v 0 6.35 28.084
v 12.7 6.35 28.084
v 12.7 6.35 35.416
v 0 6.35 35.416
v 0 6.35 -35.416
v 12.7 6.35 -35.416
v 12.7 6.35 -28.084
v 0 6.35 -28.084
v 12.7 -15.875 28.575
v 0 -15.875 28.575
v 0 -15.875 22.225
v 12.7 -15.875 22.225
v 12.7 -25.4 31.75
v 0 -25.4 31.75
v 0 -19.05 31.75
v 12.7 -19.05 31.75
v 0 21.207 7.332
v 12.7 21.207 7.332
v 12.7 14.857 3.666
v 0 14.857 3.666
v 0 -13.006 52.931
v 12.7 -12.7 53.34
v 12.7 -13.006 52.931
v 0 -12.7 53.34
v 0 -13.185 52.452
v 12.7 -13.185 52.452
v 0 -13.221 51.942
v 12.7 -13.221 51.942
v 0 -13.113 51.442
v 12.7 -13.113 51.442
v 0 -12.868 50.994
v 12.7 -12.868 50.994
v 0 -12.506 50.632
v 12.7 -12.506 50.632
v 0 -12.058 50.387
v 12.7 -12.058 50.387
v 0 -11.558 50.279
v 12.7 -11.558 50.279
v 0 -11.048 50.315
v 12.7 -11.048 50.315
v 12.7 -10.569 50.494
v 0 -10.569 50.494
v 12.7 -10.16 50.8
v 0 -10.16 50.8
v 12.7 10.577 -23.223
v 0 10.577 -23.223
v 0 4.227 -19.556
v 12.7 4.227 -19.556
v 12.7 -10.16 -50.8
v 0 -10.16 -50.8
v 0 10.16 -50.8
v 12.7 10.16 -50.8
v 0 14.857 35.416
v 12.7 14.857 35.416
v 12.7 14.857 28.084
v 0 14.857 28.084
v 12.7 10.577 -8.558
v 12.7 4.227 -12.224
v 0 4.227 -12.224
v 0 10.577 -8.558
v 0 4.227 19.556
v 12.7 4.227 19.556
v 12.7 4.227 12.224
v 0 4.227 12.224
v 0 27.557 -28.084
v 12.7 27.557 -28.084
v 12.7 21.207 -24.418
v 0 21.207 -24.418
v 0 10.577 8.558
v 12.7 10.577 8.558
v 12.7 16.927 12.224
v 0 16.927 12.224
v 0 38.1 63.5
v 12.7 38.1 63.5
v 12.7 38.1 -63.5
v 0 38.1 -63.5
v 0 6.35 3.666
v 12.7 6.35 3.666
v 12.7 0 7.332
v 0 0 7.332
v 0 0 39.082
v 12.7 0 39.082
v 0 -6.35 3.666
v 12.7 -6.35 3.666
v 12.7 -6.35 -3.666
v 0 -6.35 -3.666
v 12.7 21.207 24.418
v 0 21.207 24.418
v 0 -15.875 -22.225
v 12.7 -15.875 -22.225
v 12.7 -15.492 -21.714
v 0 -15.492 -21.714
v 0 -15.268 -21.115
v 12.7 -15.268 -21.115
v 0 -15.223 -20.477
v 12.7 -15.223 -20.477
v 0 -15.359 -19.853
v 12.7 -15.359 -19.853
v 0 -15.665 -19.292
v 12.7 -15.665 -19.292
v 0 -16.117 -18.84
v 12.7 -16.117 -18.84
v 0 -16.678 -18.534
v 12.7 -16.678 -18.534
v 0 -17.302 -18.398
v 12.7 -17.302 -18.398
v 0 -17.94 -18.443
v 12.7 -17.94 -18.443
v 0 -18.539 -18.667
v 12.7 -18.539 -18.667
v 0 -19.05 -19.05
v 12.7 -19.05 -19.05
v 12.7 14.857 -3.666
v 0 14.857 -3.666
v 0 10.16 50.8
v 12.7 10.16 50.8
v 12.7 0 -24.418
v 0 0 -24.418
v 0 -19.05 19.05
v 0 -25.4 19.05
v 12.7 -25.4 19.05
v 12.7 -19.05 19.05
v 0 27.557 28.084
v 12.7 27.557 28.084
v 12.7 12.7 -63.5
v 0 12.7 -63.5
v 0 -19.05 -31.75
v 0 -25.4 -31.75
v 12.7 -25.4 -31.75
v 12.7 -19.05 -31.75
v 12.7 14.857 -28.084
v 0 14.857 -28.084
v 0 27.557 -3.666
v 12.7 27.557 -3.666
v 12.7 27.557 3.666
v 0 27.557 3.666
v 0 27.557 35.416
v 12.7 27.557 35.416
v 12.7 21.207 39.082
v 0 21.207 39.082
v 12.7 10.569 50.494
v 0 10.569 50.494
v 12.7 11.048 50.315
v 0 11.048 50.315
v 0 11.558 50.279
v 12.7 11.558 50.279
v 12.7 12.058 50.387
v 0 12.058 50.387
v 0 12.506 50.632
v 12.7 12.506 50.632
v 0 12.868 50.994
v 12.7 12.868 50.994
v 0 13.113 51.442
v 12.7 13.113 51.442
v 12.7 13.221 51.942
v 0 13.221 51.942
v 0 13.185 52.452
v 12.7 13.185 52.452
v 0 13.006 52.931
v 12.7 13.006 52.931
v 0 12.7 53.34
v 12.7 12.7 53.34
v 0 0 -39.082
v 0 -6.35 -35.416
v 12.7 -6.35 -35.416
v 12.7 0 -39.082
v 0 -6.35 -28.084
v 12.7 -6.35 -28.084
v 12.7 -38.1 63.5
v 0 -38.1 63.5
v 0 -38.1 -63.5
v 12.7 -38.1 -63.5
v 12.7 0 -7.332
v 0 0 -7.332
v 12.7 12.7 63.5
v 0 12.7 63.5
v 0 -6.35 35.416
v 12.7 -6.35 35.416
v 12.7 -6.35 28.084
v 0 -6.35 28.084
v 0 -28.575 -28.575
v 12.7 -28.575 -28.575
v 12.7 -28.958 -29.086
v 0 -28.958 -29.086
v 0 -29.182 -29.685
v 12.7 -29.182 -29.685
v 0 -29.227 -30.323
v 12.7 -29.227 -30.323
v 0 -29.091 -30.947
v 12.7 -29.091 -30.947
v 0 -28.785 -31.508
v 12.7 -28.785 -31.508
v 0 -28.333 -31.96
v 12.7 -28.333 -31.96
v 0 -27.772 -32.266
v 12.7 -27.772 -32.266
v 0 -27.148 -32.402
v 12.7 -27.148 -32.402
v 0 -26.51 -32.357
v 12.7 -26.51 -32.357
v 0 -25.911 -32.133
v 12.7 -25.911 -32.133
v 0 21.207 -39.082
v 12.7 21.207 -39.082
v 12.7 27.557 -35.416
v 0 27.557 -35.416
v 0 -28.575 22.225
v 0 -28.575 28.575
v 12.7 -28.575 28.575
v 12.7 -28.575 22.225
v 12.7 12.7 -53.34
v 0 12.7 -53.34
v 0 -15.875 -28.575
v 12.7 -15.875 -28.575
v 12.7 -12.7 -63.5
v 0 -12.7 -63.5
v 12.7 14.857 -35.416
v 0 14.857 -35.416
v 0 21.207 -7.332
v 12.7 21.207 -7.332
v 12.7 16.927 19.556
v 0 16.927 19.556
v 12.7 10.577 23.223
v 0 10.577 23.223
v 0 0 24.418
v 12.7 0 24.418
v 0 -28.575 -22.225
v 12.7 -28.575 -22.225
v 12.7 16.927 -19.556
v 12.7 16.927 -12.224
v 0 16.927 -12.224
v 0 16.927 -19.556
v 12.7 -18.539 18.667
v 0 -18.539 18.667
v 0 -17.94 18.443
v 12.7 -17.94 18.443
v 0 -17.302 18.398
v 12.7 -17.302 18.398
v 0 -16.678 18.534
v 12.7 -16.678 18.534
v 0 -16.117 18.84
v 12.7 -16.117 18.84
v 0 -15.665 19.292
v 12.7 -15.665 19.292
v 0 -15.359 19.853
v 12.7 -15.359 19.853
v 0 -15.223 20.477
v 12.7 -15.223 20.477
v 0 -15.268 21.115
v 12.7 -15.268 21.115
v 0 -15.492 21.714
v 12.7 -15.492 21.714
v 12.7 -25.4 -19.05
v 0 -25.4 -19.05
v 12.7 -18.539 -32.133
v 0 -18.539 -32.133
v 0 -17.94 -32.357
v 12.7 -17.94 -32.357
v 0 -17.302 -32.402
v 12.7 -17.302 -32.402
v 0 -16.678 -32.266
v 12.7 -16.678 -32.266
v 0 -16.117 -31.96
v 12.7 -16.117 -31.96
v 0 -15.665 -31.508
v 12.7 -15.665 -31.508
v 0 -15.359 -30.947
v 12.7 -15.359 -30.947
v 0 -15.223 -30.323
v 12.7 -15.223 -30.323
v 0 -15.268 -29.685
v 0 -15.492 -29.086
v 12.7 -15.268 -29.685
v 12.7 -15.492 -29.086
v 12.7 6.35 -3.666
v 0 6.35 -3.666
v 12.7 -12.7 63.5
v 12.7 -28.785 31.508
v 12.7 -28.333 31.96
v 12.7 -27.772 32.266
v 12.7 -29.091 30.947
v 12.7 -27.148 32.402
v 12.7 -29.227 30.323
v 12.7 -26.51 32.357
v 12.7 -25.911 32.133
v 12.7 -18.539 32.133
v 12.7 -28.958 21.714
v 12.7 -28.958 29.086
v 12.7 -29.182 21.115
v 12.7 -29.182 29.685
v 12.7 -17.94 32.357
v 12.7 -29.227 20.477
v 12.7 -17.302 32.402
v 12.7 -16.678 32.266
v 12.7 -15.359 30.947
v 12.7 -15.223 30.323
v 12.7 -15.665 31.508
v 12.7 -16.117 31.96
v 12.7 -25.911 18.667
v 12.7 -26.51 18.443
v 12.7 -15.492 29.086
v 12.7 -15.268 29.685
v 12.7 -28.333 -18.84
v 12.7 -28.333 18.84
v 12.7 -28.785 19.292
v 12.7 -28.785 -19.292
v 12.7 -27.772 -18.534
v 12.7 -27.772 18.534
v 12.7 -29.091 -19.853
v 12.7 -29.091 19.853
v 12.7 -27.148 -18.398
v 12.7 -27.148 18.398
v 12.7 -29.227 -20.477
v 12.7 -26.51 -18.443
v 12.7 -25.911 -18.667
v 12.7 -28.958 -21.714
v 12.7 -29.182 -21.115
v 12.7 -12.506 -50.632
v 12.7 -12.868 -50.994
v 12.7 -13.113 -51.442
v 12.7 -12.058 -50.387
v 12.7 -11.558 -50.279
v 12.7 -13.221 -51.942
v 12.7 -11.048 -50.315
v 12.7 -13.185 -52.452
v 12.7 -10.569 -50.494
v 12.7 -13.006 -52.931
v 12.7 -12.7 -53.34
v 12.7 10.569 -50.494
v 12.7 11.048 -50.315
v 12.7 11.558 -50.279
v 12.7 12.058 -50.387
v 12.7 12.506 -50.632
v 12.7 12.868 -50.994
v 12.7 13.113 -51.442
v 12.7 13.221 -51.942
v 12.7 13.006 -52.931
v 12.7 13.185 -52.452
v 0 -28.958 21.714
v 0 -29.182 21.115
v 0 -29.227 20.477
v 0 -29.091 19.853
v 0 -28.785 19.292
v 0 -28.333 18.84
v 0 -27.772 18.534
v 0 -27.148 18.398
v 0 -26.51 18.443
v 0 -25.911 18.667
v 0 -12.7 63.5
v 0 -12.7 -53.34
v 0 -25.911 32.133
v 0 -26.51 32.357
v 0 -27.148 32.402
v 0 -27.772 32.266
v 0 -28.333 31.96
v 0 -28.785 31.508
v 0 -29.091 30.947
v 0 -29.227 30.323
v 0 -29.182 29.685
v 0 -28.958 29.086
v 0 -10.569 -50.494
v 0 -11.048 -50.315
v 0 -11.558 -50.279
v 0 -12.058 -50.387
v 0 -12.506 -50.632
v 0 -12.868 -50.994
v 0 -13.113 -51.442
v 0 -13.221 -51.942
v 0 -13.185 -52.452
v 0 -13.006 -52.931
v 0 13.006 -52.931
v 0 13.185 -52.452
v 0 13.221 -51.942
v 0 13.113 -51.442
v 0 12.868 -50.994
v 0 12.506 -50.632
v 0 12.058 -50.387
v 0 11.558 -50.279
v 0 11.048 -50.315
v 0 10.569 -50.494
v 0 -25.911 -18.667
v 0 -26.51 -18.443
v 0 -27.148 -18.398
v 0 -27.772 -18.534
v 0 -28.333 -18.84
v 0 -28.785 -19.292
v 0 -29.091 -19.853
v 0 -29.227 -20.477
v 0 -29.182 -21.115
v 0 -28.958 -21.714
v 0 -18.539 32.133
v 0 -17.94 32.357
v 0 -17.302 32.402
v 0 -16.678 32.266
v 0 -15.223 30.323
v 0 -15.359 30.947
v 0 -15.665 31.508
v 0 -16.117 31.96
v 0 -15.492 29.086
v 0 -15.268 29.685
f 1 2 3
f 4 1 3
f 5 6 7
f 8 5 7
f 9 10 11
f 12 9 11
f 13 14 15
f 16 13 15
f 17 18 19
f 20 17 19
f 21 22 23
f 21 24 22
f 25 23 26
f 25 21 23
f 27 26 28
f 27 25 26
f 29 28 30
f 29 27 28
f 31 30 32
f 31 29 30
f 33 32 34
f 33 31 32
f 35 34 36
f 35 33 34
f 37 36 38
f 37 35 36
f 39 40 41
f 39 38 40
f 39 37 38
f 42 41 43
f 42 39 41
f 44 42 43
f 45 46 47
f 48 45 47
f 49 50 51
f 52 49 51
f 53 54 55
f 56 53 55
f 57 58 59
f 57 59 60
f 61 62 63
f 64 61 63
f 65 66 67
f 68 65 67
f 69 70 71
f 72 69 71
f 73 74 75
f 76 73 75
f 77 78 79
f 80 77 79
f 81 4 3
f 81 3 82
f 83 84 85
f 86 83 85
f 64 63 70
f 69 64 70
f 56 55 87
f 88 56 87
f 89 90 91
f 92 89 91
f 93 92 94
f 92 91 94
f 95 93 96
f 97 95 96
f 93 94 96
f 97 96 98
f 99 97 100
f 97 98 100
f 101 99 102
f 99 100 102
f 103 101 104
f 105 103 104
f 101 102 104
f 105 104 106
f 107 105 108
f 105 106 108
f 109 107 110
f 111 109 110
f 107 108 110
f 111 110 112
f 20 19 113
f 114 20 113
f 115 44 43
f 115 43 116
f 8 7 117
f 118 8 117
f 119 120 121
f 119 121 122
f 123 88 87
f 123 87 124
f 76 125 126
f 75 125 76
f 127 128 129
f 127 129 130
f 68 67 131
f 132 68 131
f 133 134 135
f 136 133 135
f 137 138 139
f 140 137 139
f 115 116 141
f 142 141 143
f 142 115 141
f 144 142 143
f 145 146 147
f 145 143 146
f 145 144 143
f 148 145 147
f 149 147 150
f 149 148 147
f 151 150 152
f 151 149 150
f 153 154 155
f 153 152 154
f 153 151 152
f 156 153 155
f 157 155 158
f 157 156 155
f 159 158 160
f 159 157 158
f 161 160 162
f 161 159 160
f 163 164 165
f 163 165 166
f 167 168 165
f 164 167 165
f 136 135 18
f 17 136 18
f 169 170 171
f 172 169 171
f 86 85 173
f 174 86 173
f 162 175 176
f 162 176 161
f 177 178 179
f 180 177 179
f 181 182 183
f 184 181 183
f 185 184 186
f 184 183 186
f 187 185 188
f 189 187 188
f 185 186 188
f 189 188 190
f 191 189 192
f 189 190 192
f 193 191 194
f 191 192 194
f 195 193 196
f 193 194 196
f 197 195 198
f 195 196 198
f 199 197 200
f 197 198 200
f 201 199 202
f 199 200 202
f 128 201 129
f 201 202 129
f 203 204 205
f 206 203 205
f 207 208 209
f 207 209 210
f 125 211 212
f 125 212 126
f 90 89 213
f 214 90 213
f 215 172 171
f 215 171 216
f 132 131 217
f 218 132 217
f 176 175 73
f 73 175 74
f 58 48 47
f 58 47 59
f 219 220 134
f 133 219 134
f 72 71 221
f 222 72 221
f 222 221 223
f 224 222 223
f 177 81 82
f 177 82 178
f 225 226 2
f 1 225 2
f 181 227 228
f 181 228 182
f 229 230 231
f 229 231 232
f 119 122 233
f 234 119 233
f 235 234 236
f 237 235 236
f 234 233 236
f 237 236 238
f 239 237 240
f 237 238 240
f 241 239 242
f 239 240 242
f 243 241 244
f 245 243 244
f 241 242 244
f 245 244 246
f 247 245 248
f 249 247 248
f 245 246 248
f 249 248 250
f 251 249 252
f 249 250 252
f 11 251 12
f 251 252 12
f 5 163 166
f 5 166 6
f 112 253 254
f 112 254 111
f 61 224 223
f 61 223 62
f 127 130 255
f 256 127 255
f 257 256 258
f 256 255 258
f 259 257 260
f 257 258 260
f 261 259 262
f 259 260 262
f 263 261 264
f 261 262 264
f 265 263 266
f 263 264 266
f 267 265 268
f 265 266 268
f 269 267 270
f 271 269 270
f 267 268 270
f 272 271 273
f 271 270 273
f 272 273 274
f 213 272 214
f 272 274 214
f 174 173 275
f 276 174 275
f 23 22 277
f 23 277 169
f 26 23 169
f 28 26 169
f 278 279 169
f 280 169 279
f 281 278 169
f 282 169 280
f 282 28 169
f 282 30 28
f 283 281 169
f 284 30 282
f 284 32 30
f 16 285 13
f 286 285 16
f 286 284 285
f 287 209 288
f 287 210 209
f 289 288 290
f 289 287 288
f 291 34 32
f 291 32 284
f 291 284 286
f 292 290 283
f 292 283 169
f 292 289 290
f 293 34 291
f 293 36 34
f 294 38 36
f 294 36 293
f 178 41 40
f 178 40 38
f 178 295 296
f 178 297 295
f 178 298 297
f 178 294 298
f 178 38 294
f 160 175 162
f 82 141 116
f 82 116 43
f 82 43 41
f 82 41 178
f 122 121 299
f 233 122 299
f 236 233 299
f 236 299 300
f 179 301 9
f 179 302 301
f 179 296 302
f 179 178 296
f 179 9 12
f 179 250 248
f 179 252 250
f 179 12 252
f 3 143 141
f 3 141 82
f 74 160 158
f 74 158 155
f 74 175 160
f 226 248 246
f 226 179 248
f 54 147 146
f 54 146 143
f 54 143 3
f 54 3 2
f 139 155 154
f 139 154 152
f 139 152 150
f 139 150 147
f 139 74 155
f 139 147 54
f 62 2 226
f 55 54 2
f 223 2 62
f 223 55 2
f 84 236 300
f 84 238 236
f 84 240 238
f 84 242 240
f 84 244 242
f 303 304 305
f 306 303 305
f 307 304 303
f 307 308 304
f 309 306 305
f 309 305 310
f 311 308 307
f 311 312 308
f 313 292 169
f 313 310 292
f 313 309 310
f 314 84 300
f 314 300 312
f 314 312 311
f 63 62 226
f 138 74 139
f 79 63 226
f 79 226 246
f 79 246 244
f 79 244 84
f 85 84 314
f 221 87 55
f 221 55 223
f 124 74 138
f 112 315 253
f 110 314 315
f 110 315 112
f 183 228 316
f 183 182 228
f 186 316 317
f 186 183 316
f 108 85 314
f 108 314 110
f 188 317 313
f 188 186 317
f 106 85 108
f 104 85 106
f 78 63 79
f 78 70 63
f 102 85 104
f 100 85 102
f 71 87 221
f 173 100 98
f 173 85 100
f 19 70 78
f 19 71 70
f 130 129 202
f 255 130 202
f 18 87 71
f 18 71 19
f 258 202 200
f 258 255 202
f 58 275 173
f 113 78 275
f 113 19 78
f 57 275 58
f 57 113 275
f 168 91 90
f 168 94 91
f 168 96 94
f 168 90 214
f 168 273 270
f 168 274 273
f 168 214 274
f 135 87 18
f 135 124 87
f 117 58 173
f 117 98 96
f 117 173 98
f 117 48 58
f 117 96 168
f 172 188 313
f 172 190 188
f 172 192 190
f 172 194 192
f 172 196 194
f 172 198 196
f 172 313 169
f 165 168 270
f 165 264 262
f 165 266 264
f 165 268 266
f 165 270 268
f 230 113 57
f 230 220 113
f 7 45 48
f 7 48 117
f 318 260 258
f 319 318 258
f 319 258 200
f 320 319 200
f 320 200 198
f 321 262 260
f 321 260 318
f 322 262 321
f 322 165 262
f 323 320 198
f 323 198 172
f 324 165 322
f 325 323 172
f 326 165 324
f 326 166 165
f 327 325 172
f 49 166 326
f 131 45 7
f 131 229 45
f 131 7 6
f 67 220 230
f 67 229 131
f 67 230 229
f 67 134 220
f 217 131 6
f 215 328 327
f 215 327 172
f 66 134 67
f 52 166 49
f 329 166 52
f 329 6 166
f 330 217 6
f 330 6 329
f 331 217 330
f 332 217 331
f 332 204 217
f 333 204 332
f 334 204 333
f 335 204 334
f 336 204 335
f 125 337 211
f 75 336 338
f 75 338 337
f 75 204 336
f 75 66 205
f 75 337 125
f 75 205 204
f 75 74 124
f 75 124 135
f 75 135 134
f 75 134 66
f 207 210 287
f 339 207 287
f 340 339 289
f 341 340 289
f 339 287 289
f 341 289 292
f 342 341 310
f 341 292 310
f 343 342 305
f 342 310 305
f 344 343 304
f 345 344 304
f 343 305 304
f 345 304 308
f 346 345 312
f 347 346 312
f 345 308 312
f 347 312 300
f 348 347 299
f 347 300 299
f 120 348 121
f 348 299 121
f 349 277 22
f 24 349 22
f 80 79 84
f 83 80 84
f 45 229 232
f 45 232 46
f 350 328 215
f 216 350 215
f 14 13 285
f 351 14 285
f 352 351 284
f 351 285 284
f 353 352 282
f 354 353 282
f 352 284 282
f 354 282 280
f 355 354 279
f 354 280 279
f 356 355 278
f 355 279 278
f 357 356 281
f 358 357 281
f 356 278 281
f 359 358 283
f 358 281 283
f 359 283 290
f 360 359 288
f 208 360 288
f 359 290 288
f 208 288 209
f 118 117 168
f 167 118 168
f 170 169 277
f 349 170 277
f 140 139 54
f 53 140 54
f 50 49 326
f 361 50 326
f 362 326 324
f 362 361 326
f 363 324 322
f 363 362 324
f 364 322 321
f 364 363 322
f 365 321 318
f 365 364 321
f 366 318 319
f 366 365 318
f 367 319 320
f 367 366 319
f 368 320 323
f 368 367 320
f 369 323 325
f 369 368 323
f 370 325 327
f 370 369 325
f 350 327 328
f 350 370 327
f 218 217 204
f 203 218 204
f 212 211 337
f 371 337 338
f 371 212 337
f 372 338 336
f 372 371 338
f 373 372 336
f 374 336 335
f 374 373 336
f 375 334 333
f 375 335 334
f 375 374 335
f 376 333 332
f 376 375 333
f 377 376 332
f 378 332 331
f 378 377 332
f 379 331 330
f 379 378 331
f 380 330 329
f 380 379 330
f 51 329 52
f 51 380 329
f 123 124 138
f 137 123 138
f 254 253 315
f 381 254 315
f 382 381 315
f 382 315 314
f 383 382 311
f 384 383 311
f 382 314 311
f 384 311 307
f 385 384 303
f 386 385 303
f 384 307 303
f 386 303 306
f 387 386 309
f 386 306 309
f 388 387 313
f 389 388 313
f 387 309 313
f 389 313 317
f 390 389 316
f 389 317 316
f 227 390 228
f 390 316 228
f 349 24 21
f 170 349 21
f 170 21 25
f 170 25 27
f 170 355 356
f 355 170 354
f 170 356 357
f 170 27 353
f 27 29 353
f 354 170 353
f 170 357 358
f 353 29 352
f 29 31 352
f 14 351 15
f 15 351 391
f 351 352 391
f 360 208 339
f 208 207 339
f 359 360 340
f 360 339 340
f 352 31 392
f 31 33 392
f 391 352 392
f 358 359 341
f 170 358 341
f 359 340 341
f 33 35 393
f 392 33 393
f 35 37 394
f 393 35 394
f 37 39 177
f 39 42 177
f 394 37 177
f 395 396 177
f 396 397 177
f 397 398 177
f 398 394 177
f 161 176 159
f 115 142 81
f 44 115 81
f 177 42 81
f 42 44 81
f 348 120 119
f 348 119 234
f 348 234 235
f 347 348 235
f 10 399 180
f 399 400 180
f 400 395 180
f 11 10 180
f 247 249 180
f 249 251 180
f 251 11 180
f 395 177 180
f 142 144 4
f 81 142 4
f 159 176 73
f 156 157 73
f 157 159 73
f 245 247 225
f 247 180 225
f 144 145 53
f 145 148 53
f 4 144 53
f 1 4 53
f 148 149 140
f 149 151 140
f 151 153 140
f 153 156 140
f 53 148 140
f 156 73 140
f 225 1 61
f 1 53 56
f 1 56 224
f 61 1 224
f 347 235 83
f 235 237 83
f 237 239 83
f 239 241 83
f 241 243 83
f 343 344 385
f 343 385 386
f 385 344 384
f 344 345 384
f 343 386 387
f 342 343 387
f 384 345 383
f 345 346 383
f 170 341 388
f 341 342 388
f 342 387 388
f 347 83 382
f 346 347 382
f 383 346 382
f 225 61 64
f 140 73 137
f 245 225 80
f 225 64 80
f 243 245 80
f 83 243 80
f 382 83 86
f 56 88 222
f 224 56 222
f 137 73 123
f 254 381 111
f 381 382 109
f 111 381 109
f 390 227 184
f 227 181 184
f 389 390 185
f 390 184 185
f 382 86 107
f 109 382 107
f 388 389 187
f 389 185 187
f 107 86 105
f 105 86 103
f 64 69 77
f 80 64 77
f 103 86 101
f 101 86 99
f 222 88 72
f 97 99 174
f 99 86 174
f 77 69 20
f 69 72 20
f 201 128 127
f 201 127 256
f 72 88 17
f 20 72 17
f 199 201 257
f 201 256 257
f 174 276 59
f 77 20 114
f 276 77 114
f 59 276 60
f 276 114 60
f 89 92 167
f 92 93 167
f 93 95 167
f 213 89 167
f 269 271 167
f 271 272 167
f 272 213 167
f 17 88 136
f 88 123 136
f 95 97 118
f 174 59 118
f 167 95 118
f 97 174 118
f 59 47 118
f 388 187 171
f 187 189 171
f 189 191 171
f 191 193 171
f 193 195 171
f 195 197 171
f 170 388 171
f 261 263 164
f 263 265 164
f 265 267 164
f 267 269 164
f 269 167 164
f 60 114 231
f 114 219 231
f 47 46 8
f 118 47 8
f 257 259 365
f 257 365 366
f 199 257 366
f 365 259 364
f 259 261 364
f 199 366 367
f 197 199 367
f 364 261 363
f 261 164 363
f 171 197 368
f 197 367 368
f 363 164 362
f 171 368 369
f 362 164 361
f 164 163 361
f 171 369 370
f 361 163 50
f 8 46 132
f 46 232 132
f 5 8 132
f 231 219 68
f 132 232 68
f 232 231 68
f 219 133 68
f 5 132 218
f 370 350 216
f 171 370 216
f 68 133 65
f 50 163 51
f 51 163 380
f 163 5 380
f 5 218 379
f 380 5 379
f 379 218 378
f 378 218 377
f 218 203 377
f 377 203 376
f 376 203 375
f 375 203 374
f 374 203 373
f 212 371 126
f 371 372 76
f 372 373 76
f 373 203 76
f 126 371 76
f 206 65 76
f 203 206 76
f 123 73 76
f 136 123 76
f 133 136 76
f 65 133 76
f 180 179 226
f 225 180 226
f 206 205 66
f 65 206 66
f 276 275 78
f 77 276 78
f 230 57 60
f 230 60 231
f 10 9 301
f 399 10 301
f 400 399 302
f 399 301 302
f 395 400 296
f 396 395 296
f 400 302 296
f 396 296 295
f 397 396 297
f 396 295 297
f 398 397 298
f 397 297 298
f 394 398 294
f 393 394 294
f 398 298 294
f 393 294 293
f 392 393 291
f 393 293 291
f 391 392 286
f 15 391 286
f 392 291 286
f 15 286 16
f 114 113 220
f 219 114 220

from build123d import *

# Parameters (mm, degrees)
SKETCH3_W                 = 101.6
SKETCH3_H                 = 76.2
SQUARE_EXTRUSION_DEPTH    = 12.7
SKETCH4_R                 = 2.24536
SKETCH4_W                 = 12.7
SKETCH4_H                 = 12.7
SLOTTING_HOLES_DEPTH      = 12.7
HONEYCOMB_POCKETING_DEPTH = 12.7
SKETCH14_W                = 12.7
SKETCH14_H                = 25.4
TAB_EXTRUSION_DEPTH       = 12.7
CUT_EXTRUDE2_START        = -12.7
SKETCH15_R                = 1.796051224
CUT_EXTRUDE2_DEPTH        = 12.7


with BuildPart() as part:
    # Sketch3 → Square Extrusion (new body)
    with BuildSketch(Plane(origin=(0, 0, 0), x_dir=(0, 0, -1), z_dir=(1, 0, 0))):
        Rectangle(SKETCH3_W, SKETCH3_H)
    extrude(amount=SQUARE_EXTRUSION_DEPTH)

    # Sketch4 → Slotting Holes (cut)
    with BuildSketch(Plane(origin=(12.7, 0, 0), x_dir=(0, 0, -1), z_dir=(1, 0, 0))):
        with BuildLine():
            ThreePointArc((-28.574581463, -15.875), (-31.750209282, -15.874790718), (-31.75, -19.050418537))
            Line((-31.75, -19.050418537), (-31.75, -15.875))
            Line((-31.75, -15.875), (-28.574581463, -15.875))
        make_face()
        with BuildLine():
            Line((-31.75, -15.875), (-31.75, -19.050418537))
            ThreePointArc((-31.75, -19.050418537), (-29.303101219, -19.536885515), (-27.91714, -17.4625))
            ThreePointArc((-27.91714, -17.4625), (-28.08800123, -16.603374641), (-28.574581463, -15.875))
            Line((-28.574581463, -15.875), (-31.75, -15.875))
        make_face()
        with Locations((-30.1625, -26.9875)):
            Circle(SKETCH4_R)
        with Locations((-20.6375, -26.9875)):
            Circle(SKETCH4_R)
        with Locations((-20.6375, -17.4625)):
            Circle(SKETCH4_R)
        with Locations((-30.1625, -17.4625)):
            Circle(SKETCH4_R)
        with Locations((-25.4, -22.225)):
            Rectangle(SKETCH4_W, SKETCH4_H)
        with BuildLine():
            ThreePointArc((-22.225418537, -15.875), (-22.225209282, -19.050209282), (-19.05, -19.050418537))
            Line((-19.05, -19.050418537), (-19.05, -15.875))
            Line((-19.05, -15.875), (-22.225418537, -15.875))
        make_face()
        with BuildLine():
            Line((-19.05, -15.875), (-19.05, -19.050418537))
            ThreePointArc((-19.05, -19.050418537), (-18.563114485, -18.321898781), (-18.39214, -17.4625))
            ThreePointArc((-18.39214, -17.4625), (-19.778374641, -15.38800123), (-22.225418537, -15.875))
            Line((-22.225418537, -15.875), (-19.05, -15.875))
        make_face()
        with BuildLine():
            Line((-31.75, -25.399581463), (-31.75, -28.575))
            Line((-31.75, -28.575), (-28.574581463, -28.575))
            ThreePointArc((-28.574581463, -28.575), (-28.08800123, -27.846625359), (-27.91714, -26.9875))
            ThreePointArc((-27.91714, -26.9875), (-29.303101219, -24.913114485), (-31.75, -25.399581463))
        make_face()
        with BuildLine():
            Line((-28.574581463, -28.575), (-31.75, -28.575))
            Line((-31.75, -28.575), (-31.75, -25.399581463))
            ThreePointArc((-31.75, -25.399581463), (-31.750209282, -28.575209282), (-28.574581463, -28.575))
        make_face()
        with BuildLine():
            ThreePointArc((-19.05, -25.399581463), (-22.225209282, -25.399790718), (-22.225418537, -28.575))
            Line((-22.225418537, -28.575), (-19.05, -28.575))
            Line((-19.05, -28.575), (-19.05, -25.399581463))
        make_face()
        with BuildLine():
            Line((-19.05, -28.575), (-22.225418537, -28.575))
            ThreePointArc((-22.225418537, -28.575), (-19.778374641, -29.06199877), (-18.39214, -26.9875))
            ThreePointArc((-18.39214, -26.9875), (-18.563114485, -26.128101219), (-19.05, -25.399581463))
            Line((-19.05, -25.399581463), (-19.05, -28.575))
        make_face()
        with BuildLine():
            ThreePointArc((22.88286, -17.4625), (22.71199877, -16.603374641), (22.225418537, -15.875))
            Line((22.225418537, -15.875), (19.05, -15.875))
            Line((19.05, -15.875), (19.05, -19.050418537))
            ThreePointArc((19.05, -19.050418537), (21.496898781, -19.536885515), (22.88286, -17.4625))
        make_face()
        with BuildLine():
            Line((19.05, -15.875), (22.225418537, -15.875))
            ThreePointArc((22.225418537, -15.875), (19.049790718, -15.874790718), (19.05, -19.050418537))
            Line((19.05, -19.050418537), (19.05, -15.875))
        make_face()
        with Locations((30.1625, -17.4625)):
            Circle(SKETCH4_R)
        with Locations((20.6375, -17.4625)):
            Circle(SKETCH4_R)
        with Locations((20.6375, -26.9875)):
            Circle(SKETCH4_R)
        with Locations((30.1625, -26.9875)):
            Circle(SKETCH4_R)
        with Locations((25.4, -22.225)):
            Rectangle(SKETCH4_W, SKETCH4_H)
        with BuildLine():
            Line((31.75, -19.050418537), (31.75, -15.875))
            Line((31.75, -15.875), (28.574581463, -15.875))
            ThreePointArc((28.574581463, -15.875), (28.574790718, -19.050209282), (31.75, -19.050418537))
        make_face()
        with BuildLine():
            Line((28.574581463, -15.875), (31.75, -15.875))
            Line((31.75, -15.875), (31.75, -19.050418537))
            ThreePointArc((31.75, -19.050418537), (32.236885515, -18.321898781), (32.40786, -17.4625))
            ThreePointArc((32.40786, -17.4625), (31.021625359, -15.38800123), (28.574581463, -15.875))
        make_face()
        with BuildLine():
            ThreePointArc((32.40786, -26.9875), (32.236885515, -26.128101219), (31.75, -25.399581463))
            Line((31.75, -25.399581463), (31.75, -28.575))
            Line((31.75, -28.575), (28.574581463, -28.575))
            ThreePointArc((28.574581463, -28.575), (31.021625359, -29.06199877), (32.40786, -26.9875))
        make_face()
        with BuildLine():
            Line((31.75, -28.575), (31.75, -25.399581463))
            ThreePointArc((31.75, -25.399581463), (28.574790718, -25.399790718), (28.574581463, -28.575))
            Line((28.574581463, -28.575), (31.75, -28.575))
        make_face()
        with BuildLine():
            ThreePointArc((22.88286, -26.9875), (21.496898781, -24.913114485), (19.05, -25.399581463))
            Line((19.05, -25.399581463), (19.05, -28.575))
            Line((19.05, -28.575), (22.225418537, -28.575))
            ThreePointArc((22.225418537, -28.575), (22.71199877, -27.846625359), (22.88286, -26.9875))
        make_face()
        with BuildLine():
            Line((19.05, -28.575), (19.05, -25.399581463))
            ThreePointArc((19.05, -25.399581463), (19.049790718, -28.575209282), (22.225418537, -28.575))
            Line((22.225418537, -28.575), (19.05, -28.575))
        make_face()
    extrude(amount=-SLOTTING_HOLES_DEPTH, mode=Mode.SUBTRACT)

    # Sketch9 → Honeycomb Pocketing (cut)
    with BuildSketch(Plane(origin=(12.7, 0, 0), x_dir=(0, 0, -1), z_dir=(1, 0, 0))):
        Polygon((-35.416174209, 14.85738686), (-28.083825791, 14.85738686), (-24.417651581, 21.20738686), (-28.083825791, 27.55738686), (-35.416174209, 27.55738686), (-39.082348419, 21.20738686), align=None)
        Polygon((-3.666174209, -6.35), (3.666174209, -6.35), (7.332348419, 0), (3.666174209, 6.35), (-3.666174209, 6.35), (-7.332348419, 0), align=None)
        Polygon((-35.416174209, -6.35), (-28.083825791, -6.35), (-24.417651581, 0), (-28.083825791, 6.35), (-35.416174209, 6.35), (-39.082348419, 0), align=None)
        Polygon((28.083825791, -6.35), (35.416174209, -6.35), (39.082348419, 0), (35.416174209, 6.35), (28.083825791, 6.35), (24.417651581, 0), align=None)
        Polygon((-3.666174209, 14.85738686), (3.666174209, 14.85738686), (7.332348419, 21.20738686), (3.666174209, 27.55738686), (-3.666174209, 27.55738686), (-7.332348419, 21.20738686), align=None)
        Polygon((28.083825791, 14.85738686), (35.416174209, 14.85738686), (39.082348419, 21.20738686), (35.416174209, 27.55738686), (28.083825791, 27.55738686), (24.417651581, 21.20738686), align=None)
        Polygon((19.556437025, 4.227257458), (12.224088606, 4.227257458), (8.557914397, 10.577257458), (12.224088606, 16.927257458), (19.556437025, 16.927257458), (23.222611234, 10.577257458), align=None)
        Polygon((-12.224088606, 4.227257458), (-8.557914397, 10.577257458), (-12.224088606, 16.927257458), (-19.556437025, 16.927257458), (-23.222611234, 10.577257458), (-19.556437025, 4.227257458), align=None)
    extrude(amount=-HONEYCOMB_POCKETING_DEPTH, mode=Mode.SUBTRACT)

    # Sketch14 → Tab Extrusion (add)
    with BuildSketch(Plane(origin=(12.7, 0, 0), x_dir=(0, 0, -1), z_dir=(1, 0, 0))):
        with Locations((-57.15, 25.4)):
            Rectangle(SKETCH14_W, SKETCH14_H)
        with Locations((-57.15, -25.4)):
            Rectangle(SKETCH14_W, SKETCH14_H)
        with Locations((57.15, -25.4)):
            Rectangle(SKETCH14_W, SKETCH14_H)
        with Locations((57.15, 25.4)):
            Rectangle(SKETCH14_W, SKETCH14_H)
    extrude(amount=-TAB_EXTRUSION_DEPTH)

    # Sketch15 → Cut-Extrude2 (cut)
    with BuildSketch(Plane(origin=(12.7, 0, 0), x_dir=(0, 0, -1), z_dir=(1, 0, 0)).offset(CUT_EXTRUDE2_START)):
        with Locations((-52.07, 11.43)):
            Circle(SKETCH15_R)
        with Locations((-52.07, -11.43)):
            Circle(SKETCH15_R)
        with Locations((52.07, -11.43)):
            Circle(SKETCH15_R)
        with Locations((52.07, 11.43)):
            Circle(SKETCH15_R)
    extrude(amount=CUT_EXTRUDE2_DEPTH, mode=Mode.SUBTRACT)


solid = part.part
